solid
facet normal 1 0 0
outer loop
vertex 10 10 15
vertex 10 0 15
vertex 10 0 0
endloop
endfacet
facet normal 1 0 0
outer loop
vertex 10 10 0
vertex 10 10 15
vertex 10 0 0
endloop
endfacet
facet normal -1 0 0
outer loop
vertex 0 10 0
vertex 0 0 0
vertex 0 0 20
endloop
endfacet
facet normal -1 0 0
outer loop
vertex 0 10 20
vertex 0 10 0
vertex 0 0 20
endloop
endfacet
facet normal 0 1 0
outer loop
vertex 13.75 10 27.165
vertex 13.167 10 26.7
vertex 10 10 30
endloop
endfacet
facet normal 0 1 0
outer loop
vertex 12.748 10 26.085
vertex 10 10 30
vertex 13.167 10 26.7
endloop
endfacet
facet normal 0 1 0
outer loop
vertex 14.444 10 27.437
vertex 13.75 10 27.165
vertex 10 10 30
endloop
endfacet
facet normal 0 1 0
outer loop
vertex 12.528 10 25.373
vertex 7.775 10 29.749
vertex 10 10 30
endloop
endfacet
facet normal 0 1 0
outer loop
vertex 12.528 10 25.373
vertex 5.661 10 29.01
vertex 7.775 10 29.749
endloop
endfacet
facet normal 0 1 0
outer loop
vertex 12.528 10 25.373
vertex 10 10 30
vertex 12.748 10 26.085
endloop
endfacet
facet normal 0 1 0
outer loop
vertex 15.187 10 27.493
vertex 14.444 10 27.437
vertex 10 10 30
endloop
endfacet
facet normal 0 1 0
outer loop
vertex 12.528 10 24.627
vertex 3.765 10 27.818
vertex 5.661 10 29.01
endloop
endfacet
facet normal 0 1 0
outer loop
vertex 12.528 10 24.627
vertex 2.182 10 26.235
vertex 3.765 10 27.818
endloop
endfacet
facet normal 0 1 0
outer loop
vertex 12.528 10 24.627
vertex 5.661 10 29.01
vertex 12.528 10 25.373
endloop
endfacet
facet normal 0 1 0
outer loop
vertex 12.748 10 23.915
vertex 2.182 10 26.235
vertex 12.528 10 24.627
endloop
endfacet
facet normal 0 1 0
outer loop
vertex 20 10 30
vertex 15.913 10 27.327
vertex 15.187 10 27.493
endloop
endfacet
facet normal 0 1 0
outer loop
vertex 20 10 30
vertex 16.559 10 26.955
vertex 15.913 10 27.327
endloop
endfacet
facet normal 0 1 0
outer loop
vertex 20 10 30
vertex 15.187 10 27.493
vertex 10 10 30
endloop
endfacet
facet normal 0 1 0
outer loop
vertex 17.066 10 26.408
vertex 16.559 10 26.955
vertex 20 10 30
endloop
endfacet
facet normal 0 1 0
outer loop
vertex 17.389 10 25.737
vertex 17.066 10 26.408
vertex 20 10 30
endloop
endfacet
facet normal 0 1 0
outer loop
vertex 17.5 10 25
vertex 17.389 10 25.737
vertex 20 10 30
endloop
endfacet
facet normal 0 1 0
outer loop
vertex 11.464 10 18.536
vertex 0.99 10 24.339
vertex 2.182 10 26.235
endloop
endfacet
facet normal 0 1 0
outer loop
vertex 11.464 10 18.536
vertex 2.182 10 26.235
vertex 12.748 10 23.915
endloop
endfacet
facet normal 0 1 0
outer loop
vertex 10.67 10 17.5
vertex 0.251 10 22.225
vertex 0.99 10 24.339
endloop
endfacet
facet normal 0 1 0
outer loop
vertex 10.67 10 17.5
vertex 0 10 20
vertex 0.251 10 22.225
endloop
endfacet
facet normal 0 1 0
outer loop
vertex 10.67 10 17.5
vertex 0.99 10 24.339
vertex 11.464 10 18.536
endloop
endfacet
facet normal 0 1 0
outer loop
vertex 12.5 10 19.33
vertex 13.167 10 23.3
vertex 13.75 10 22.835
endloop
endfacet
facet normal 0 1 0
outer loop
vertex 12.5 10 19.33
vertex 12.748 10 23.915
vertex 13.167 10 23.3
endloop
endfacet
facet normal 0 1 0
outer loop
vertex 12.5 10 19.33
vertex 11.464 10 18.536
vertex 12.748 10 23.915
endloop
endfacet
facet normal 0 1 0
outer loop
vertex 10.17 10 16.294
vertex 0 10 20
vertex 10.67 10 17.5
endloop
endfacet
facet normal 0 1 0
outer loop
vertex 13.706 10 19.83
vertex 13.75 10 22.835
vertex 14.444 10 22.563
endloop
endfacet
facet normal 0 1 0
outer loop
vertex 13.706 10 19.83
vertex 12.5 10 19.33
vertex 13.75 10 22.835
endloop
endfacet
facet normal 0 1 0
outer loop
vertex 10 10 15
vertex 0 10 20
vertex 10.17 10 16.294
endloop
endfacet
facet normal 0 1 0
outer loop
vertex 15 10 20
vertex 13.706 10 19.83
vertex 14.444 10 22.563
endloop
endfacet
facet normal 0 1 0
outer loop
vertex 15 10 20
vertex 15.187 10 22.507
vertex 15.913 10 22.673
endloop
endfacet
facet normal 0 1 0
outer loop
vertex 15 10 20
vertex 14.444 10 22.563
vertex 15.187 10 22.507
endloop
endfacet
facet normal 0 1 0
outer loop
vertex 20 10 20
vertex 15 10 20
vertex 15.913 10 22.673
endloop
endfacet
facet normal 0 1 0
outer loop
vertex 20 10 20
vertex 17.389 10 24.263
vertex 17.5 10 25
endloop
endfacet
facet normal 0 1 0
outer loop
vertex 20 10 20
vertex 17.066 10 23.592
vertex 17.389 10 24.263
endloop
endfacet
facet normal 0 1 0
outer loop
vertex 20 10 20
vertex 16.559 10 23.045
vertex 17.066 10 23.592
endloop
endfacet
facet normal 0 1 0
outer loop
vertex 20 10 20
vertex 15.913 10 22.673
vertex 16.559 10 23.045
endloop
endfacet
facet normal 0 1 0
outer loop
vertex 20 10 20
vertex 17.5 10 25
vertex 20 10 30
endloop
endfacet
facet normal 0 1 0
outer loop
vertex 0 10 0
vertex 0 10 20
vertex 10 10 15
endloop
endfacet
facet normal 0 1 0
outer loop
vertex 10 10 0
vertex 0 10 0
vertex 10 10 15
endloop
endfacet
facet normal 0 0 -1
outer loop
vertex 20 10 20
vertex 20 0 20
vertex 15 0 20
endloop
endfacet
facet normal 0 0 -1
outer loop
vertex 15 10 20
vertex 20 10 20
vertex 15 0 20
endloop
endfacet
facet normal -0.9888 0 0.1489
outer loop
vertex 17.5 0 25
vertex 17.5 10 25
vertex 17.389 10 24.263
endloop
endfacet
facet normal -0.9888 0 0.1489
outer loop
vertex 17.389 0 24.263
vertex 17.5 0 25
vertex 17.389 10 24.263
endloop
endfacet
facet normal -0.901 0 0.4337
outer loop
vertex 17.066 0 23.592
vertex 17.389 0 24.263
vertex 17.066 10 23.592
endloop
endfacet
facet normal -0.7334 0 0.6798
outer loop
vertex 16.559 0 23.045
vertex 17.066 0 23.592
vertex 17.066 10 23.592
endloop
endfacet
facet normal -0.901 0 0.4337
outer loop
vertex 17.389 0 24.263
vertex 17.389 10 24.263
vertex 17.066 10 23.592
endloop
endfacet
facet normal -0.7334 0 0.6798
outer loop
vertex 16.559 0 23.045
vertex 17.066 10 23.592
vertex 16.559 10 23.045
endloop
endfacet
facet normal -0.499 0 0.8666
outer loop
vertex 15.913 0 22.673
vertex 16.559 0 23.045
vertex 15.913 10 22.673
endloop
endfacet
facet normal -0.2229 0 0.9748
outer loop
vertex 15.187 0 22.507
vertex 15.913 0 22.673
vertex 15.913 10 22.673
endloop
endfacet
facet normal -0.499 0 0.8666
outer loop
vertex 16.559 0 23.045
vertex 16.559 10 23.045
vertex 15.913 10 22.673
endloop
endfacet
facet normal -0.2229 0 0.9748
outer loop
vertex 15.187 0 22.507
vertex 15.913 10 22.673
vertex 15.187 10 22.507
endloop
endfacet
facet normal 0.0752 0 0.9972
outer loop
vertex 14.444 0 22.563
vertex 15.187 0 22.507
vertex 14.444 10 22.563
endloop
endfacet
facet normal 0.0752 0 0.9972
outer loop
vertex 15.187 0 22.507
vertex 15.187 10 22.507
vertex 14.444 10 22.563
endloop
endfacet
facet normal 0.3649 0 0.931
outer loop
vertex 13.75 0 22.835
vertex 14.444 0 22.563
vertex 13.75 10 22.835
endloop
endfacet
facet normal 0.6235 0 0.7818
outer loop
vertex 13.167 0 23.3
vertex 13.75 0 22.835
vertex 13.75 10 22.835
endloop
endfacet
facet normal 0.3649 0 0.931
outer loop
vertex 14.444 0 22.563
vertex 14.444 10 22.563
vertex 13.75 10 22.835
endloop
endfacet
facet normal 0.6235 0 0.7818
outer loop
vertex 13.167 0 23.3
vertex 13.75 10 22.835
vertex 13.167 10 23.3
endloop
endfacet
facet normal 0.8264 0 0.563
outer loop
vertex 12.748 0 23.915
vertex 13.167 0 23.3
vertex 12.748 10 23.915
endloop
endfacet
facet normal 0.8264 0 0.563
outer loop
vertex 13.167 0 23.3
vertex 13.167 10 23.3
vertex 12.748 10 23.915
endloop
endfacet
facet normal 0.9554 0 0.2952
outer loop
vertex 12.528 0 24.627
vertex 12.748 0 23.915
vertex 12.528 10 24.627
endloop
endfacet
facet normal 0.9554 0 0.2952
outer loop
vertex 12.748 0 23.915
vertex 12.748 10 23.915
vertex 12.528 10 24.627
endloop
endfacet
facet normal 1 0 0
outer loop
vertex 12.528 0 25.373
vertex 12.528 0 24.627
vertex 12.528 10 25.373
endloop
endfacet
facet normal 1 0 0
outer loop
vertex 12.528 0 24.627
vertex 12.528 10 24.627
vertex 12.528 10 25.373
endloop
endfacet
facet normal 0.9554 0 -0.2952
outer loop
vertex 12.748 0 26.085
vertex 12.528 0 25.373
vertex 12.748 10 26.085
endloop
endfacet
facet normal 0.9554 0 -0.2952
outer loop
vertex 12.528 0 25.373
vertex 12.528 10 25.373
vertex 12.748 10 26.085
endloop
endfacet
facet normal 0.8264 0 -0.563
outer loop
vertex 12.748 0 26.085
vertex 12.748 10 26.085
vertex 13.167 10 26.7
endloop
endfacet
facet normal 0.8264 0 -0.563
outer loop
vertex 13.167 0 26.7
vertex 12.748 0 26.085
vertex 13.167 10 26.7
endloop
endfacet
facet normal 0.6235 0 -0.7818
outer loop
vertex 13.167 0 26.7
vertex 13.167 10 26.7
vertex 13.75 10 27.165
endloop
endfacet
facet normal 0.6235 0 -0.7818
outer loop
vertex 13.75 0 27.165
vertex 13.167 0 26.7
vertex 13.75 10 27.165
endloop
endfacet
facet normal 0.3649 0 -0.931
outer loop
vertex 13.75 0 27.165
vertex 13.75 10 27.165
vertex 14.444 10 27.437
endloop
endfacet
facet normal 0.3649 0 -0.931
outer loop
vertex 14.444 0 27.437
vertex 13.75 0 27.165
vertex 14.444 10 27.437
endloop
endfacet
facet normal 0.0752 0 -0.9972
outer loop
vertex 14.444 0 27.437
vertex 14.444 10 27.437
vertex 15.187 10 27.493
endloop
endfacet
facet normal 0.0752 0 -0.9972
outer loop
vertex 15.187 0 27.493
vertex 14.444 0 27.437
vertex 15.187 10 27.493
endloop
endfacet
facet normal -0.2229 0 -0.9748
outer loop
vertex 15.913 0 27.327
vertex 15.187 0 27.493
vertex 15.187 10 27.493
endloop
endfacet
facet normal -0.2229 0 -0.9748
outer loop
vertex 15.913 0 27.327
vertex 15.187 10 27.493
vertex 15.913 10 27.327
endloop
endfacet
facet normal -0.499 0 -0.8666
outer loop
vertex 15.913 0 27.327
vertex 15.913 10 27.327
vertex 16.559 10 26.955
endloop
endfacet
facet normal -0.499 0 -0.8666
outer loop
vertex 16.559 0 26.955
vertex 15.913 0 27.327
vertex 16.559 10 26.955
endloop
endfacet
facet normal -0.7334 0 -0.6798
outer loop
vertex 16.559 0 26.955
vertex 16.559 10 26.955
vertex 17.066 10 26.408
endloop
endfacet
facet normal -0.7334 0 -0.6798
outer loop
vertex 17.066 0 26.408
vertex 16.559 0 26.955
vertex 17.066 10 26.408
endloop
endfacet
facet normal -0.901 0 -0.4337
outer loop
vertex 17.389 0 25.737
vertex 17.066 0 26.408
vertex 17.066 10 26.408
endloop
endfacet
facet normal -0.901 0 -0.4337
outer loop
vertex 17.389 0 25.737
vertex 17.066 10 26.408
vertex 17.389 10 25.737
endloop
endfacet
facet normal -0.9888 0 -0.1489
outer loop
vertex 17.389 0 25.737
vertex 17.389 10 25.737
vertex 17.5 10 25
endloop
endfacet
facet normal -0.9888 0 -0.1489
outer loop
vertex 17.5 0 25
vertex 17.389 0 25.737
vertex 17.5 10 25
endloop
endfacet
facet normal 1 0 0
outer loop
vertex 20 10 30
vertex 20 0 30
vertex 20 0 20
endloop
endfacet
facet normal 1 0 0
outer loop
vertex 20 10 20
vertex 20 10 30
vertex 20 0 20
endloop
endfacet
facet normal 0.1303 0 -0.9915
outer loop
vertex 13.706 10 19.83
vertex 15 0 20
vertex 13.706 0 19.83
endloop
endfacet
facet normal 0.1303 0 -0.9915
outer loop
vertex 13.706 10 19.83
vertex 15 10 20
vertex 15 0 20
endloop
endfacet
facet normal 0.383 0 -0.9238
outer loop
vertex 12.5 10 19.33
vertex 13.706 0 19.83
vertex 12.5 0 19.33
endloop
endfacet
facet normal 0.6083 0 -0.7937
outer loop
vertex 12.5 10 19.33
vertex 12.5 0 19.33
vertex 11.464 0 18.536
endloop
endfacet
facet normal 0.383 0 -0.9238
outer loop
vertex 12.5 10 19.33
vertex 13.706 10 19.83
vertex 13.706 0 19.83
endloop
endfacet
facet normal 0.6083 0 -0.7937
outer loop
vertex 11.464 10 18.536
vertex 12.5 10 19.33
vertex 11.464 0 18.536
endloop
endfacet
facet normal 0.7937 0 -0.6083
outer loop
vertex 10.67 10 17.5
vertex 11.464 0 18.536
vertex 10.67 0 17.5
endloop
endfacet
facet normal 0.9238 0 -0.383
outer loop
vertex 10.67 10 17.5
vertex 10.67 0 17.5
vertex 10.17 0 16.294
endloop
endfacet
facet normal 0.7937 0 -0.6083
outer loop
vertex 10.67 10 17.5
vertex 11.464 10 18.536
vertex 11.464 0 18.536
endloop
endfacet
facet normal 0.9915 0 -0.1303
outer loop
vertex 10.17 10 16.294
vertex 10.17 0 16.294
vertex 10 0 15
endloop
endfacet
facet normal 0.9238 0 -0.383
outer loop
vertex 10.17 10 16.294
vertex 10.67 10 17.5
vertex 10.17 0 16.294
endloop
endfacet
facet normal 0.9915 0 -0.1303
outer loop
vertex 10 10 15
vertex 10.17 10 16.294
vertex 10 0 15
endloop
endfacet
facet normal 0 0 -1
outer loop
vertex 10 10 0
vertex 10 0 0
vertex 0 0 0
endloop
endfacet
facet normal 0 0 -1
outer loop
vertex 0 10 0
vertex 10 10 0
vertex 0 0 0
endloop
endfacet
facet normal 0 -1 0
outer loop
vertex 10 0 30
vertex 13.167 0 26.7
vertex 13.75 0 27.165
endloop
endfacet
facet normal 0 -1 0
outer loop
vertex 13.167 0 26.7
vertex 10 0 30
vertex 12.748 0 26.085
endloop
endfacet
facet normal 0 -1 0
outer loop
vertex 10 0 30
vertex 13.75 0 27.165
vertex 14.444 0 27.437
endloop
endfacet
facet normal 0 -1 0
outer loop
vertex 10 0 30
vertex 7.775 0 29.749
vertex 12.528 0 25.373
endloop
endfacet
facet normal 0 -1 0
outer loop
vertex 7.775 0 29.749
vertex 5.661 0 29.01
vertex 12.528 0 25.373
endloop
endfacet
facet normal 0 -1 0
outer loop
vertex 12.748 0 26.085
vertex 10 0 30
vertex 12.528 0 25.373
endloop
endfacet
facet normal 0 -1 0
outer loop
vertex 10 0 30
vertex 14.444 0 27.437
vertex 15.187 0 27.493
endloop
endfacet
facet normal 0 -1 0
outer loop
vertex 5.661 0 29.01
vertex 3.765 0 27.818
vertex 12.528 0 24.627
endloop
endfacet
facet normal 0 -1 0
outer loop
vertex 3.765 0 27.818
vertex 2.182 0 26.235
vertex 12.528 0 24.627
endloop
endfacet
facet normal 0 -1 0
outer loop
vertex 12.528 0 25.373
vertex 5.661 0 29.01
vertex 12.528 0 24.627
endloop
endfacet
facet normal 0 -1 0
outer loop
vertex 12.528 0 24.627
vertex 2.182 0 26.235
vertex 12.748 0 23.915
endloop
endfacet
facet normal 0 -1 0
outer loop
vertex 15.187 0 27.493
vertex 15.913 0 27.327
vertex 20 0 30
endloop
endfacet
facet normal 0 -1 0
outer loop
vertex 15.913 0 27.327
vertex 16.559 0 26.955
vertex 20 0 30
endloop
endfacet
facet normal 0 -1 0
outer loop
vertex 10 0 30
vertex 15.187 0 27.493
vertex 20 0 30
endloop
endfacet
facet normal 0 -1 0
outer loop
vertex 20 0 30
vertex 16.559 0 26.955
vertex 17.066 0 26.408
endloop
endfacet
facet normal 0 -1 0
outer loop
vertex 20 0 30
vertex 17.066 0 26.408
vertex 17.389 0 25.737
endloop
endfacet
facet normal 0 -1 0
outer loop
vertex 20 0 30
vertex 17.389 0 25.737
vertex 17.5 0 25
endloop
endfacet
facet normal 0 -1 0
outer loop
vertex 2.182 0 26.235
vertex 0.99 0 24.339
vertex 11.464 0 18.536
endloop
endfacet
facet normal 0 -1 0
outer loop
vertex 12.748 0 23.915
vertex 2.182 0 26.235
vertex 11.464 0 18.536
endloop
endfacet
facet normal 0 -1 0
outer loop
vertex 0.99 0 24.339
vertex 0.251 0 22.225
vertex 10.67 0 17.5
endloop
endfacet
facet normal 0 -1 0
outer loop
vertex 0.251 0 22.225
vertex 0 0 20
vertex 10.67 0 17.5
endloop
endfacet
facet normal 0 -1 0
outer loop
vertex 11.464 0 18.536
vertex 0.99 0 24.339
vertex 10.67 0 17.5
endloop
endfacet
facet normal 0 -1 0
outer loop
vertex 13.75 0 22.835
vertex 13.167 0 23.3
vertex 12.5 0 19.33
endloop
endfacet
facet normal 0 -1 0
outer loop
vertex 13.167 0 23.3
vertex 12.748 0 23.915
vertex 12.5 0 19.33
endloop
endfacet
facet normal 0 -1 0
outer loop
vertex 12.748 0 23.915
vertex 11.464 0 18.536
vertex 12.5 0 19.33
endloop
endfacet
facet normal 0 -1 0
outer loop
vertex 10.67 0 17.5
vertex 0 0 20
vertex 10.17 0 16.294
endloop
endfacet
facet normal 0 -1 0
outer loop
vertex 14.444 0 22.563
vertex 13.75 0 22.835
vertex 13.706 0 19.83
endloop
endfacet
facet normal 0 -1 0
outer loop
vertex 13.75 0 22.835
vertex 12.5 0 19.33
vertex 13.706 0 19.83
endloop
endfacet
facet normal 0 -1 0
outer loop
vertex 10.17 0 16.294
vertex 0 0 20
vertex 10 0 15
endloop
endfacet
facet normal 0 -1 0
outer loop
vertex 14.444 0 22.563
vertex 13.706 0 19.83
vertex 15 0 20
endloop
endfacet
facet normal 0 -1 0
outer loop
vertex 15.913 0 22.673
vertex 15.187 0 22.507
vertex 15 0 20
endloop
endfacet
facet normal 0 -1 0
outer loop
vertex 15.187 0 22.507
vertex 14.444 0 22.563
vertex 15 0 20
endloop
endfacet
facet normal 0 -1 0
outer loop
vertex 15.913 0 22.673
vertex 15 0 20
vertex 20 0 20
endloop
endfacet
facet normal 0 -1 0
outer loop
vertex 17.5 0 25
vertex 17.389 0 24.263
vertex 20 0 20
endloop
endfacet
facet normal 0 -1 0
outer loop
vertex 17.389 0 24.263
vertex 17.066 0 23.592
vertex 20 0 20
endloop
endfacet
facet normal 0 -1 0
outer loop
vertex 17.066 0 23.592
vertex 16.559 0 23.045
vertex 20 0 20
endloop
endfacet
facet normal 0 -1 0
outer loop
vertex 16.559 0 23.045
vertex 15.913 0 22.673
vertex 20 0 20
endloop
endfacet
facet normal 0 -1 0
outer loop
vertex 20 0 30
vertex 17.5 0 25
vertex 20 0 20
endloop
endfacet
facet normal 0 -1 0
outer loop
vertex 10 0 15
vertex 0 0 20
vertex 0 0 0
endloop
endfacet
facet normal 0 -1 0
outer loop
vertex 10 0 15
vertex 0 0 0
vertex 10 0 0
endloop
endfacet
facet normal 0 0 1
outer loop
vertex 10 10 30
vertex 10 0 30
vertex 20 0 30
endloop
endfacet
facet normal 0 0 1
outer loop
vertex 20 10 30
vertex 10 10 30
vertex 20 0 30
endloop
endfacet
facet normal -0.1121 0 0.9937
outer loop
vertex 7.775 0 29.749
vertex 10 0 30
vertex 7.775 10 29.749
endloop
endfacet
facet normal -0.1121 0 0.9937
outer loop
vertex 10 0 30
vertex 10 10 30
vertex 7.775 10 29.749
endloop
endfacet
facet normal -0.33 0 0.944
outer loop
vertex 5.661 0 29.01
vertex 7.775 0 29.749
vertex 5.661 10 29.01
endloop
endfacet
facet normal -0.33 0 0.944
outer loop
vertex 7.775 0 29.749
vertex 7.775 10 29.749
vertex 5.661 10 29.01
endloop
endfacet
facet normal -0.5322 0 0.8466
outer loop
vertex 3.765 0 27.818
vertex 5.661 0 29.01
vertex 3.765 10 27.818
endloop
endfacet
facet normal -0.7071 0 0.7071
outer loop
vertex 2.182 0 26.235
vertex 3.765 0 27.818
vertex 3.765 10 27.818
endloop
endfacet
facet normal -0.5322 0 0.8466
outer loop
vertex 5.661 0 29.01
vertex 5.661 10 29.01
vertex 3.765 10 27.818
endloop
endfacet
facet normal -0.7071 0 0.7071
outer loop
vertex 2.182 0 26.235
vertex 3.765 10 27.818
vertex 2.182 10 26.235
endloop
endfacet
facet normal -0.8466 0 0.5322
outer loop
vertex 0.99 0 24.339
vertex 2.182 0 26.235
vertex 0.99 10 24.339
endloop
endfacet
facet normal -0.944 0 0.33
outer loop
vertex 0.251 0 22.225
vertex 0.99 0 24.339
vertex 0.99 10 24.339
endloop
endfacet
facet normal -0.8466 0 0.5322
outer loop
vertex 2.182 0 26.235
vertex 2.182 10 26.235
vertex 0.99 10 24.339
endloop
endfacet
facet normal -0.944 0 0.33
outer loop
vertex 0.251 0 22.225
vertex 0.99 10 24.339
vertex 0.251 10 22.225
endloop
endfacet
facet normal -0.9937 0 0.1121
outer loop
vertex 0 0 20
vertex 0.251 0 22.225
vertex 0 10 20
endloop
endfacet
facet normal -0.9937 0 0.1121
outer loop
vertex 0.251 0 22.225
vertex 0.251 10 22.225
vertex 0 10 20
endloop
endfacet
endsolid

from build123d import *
from OCP.BRepFilletAPI import BRepFilletAPI_MakeFillet

# Parameters (mm, degrees)
BOSS_EXTRUDE1_DEPTH = 10
FILLET1_R1          = 5
FILLET1_R2          = 10
SKETCH3_R           = 2.5
CUT_EXTRUDE1_DEPTH  = 38.416573868


with BuildPart() as part:
    # Sketch2 → Boss-Extrude1 (new body)
    with BuildSketch(Plane(origin=(0, 0, 0), x_dir=(1, 0, 0), z_dir=(0, 1, 0))):
        Polygon((10, 0), (0, 0), (0, -30), (5, -30), (20, -30), (20, -20), (10, -20), align=None)
    extrude(amount=BOSS_EXTRUDE1_DEPTH)

    # Fillet1: one fillet with a radius per group of edges: ONE call of the kernel's fillet builder (fillet() takes one radius for all edges)
    fillet1_edges_1 = [part.edges().sort_by_distance(p)[0] for p in [
        (10, 5, 20),
    ]]
    fillet1_edges_2 = [part.edges().sort_by_distance(p)[0] for p in [
        (0, 5, 30),
    ]]
    fillet1 = BRepFilletAPI_MakeFillet(part.part.solid().wrapped)
    for e in fillet1_edges_1:
        fillet1.Add(FILLET1_R1, e.wrapped)
    for e in fillet1_edges_2:
        fillet1.Add(FILLET1_R2, e.wrapped)
    add(Compound.cast(fillet1.Shape()), mode=Mode.REPLACE)

    # Sketch3 → Cut-Extrude1 (cut, through all)
    with BuildSketch(Plane(origin=(0, 10, 0), x_dir=(1, 0, 0), z_dir=(0, 1, 0))):
        with Locations((15, -25)):
            Circle(SKETCH3_R)
    extrude(amount=-CUT_EXTRUDE1_DEPTH, mode=Mode.SUBTRACT)


solid = part.part
